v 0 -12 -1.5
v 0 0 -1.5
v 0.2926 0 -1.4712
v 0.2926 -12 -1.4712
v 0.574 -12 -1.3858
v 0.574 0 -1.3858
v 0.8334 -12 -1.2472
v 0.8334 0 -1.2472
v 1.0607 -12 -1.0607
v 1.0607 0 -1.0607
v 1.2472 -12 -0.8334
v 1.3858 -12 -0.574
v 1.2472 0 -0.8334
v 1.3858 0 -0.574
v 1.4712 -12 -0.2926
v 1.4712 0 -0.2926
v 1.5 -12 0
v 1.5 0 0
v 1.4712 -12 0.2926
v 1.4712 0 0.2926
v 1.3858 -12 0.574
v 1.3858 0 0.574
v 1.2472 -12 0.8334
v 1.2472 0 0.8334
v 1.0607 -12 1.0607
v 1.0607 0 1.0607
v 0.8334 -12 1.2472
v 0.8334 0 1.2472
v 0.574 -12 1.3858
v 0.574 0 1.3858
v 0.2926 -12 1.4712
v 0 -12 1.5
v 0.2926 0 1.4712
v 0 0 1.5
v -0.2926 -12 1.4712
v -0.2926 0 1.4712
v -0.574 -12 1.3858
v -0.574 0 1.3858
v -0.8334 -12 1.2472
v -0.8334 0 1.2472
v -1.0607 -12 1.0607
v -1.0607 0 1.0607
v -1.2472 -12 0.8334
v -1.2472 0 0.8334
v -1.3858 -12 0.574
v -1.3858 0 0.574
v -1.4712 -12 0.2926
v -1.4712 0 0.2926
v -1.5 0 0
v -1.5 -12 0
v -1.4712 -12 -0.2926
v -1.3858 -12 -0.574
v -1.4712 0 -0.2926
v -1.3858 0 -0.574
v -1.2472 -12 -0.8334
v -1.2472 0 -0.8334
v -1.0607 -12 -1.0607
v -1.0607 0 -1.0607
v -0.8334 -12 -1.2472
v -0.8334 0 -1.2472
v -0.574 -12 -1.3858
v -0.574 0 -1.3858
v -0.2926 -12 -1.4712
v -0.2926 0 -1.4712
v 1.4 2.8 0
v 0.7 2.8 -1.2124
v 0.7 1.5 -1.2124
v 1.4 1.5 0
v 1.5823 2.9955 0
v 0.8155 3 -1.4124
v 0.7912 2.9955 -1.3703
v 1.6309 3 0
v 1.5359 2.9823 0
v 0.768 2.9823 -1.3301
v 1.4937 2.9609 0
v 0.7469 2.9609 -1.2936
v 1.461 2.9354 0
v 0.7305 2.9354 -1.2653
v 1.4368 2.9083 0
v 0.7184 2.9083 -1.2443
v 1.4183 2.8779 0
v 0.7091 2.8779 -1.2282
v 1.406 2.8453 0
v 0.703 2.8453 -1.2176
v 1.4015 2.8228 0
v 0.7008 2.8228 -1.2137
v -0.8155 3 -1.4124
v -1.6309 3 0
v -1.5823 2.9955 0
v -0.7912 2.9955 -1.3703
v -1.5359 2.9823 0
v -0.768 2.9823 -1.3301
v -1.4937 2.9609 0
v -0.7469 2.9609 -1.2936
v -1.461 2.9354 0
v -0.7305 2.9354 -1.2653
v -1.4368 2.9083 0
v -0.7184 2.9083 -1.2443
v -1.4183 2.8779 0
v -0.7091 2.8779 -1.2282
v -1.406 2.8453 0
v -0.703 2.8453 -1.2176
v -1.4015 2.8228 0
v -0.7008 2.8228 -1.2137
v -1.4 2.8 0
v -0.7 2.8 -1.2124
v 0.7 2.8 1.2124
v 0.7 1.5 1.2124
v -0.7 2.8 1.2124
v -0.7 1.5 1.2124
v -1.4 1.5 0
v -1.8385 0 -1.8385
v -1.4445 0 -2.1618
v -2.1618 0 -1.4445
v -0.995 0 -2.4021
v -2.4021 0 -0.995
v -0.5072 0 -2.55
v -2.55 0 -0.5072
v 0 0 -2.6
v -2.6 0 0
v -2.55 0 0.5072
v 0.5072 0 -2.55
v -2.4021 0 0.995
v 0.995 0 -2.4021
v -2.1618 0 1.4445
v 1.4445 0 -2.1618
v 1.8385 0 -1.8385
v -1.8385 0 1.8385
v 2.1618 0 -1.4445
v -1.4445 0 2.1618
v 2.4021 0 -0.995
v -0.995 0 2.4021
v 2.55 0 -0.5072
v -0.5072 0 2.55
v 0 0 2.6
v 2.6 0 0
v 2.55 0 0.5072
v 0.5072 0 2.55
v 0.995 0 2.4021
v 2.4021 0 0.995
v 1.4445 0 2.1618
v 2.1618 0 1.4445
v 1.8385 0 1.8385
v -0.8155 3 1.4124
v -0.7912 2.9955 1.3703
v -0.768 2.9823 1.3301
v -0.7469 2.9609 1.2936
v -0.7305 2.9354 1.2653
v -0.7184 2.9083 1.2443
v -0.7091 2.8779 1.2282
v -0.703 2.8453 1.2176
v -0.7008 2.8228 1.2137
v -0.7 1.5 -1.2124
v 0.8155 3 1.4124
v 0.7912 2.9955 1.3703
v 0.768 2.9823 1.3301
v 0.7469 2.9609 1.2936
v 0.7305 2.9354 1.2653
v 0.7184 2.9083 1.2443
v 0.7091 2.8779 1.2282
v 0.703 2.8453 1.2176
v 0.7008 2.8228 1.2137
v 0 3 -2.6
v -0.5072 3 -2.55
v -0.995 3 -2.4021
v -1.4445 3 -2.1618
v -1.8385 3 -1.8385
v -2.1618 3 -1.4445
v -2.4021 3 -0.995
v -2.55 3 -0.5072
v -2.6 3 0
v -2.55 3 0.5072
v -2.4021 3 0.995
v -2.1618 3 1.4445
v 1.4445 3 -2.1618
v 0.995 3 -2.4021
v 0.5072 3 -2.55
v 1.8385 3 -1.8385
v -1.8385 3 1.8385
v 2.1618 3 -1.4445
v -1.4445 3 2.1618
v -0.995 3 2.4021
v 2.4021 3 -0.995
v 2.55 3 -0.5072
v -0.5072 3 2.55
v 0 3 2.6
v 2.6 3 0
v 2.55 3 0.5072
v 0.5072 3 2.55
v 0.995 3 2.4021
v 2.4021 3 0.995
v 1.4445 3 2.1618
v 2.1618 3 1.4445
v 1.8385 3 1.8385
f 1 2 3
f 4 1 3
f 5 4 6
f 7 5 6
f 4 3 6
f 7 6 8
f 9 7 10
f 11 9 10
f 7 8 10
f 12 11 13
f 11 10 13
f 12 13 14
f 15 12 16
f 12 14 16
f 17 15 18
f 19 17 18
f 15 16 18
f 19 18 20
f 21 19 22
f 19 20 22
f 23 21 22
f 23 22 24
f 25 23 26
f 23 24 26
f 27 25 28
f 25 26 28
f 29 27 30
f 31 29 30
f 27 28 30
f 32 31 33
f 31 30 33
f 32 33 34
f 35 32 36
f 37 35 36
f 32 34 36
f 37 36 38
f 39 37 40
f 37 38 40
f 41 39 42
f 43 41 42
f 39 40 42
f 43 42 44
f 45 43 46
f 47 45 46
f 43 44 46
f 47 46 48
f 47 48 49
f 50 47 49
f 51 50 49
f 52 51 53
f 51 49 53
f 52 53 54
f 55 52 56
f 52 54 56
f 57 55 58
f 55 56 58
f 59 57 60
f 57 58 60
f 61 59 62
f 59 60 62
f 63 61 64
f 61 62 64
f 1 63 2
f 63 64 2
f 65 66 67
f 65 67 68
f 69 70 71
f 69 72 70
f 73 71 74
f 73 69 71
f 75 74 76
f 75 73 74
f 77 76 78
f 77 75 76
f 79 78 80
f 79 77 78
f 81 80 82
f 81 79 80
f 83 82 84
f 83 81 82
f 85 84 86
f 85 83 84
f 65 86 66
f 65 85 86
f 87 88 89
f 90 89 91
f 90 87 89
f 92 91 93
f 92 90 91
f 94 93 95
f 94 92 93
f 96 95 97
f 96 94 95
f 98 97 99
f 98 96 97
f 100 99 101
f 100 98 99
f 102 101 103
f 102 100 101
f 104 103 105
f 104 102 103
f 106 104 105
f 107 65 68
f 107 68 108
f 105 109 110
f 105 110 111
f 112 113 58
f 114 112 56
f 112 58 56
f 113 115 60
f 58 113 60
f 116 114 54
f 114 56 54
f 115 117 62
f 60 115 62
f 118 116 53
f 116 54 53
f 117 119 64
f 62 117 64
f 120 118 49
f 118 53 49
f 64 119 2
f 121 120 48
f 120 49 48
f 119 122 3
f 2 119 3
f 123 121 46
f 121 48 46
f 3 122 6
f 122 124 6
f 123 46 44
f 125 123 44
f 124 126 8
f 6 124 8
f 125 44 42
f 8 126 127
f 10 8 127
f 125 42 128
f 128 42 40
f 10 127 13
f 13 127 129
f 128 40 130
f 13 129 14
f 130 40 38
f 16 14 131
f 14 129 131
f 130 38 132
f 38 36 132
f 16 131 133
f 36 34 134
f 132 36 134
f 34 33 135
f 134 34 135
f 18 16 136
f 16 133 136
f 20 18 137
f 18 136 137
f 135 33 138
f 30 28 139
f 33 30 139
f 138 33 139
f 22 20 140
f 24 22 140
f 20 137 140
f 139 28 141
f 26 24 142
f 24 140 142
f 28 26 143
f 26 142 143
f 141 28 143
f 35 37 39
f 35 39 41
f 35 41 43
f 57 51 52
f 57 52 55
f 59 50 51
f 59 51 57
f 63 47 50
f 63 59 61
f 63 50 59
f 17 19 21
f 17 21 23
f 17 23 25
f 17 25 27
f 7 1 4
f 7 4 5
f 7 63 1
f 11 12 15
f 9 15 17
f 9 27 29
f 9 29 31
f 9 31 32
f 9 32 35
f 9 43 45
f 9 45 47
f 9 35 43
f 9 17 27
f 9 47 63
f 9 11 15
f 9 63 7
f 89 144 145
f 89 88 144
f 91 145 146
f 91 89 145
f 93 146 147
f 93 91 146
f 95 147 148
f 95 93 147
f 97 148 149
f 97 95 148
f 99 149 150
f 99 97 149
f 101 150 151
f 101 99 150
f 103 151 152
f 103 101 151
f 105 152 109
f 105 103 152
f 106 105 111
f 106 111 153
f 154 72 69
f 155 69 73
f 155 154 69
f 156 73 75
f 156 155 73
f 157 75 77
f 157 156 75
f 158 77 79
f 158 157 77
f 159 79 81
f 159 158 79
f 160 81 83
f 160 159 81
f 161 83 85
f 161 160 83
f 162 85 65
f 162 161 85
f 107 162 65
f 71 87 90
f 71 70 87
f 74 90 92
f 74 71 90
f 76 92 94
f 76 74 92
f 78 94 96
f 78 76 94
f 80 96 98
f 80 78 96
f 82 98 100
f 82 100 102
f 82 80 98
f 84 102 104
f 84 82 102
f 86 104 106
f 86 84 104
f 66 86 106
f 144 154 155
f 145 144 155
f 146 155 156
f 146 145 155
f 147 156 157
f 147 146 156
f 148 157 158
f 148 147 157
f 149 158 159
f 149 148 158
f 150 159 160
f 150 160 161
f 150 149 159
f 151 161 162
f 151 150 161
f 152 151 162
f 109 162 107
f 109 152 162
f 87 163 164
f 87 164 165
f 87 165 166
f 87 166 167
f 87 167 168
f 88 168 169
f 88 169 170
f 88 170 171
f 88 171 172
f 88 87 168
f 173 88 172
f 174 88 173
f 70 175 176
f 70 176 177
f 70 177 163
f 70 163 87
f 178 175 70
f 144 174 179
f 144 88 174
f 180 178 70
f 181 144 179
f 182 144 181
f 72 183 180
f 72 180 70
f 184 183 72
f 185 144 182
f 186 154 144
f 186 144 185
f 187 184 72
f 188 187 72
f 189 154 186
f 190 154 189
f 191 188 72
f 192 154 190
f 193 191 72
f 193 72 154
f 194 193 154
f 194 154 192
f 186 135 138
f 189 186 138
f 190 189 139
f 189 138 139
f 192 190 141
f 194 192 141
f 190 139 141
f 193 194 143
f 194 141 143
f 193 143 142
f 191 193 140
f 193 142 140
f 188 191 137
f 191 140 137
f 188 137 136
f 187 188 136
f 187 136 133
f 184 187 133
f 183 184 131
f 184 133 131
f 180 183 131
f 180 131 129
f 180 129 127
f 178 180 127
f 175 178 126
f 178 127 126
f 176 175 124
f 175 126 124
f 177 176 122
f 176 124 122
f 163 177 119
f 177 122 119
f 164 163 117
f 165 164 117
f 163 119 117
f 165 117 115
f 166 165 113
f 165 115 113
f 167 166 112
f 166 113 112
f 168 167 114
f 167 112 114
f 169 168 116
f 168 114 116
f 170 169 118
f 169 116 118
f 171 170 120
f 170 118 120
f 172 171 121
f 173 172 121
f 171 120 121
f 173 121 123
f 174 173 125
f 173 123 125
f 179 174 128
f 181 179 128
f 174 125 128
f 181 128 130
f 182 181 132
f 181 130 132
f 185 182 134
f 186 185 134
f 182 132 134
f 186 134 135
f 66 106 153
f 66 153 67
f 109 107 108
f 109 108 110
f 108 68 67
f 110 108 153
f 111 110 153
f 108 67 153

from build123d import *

# Parameters (mm, degrees)
SKETCH_1_R          = 2.6
EXTRUDE_1_DEPTH     = 3
CUT_EXTRUDE_1_DEPTH = 1.5
SKETCH_5_R          = 1.5
EXTRUDE_2_DEPTH     = 12
FILLET_1_R          = 0.2


with BuildPart() as part:
    # 草图1 → 凸台-拉伸1 (new body)
    with BuildSketch(Plane(origin=(0, 0, 0), x_dir=(1, 0, 0), z_dir=(0, 1, 0))):
        with Locations(Location((0, 0, 0), (0, 0, 270))):
            Circle(SKETCH_1_R)
    extrude(amount=EXTRUDE_1_DEPTH)

    # 草图2 → 切除-拉伸1 (cut)
    with BuildSketch(Plane(origin=(0, 3, 0), x_dir=(1, 0, 0), z_dir=(0, 1, 0))):
        Polygon((-0.7, 1.212435565), (0.7, 1.212435565), (1.4, 0), (0.7, -1.212435565), (-0.7, -1.212435565), (-1.4, 0), align=None)
    extrude(amount=-CUT_EXTRUDE_1_DEPTH, mode=Mode.SUBTRACT)

    # 草图5 → 凸台-拉伸2 (add)
    with BuildSketch(Plane.XZ):
        with Locations(Location((0, 0, 0), (0, 0, 270))):
            Circle(SKETCH_5_R)
    extrude(amount=EXTRUDE_2_DEPTH)

    # 圆角1
    fillet_1_edges = [part.edges().sort_by_distance(p)[0] for p in [
        (1.05, 3, -0.606217783),
        (1.05, 3, 0.606217783),
        (0, 3, 1.212435565),
        (-1.05, 3, 0.606217783),
        (-1.05, 3, -0.606217783),
        (0, 3, -1.212435565),
    ]]
    fillet(fillet_1_edges, radius=FILLET_1_R)


solid = part.part
